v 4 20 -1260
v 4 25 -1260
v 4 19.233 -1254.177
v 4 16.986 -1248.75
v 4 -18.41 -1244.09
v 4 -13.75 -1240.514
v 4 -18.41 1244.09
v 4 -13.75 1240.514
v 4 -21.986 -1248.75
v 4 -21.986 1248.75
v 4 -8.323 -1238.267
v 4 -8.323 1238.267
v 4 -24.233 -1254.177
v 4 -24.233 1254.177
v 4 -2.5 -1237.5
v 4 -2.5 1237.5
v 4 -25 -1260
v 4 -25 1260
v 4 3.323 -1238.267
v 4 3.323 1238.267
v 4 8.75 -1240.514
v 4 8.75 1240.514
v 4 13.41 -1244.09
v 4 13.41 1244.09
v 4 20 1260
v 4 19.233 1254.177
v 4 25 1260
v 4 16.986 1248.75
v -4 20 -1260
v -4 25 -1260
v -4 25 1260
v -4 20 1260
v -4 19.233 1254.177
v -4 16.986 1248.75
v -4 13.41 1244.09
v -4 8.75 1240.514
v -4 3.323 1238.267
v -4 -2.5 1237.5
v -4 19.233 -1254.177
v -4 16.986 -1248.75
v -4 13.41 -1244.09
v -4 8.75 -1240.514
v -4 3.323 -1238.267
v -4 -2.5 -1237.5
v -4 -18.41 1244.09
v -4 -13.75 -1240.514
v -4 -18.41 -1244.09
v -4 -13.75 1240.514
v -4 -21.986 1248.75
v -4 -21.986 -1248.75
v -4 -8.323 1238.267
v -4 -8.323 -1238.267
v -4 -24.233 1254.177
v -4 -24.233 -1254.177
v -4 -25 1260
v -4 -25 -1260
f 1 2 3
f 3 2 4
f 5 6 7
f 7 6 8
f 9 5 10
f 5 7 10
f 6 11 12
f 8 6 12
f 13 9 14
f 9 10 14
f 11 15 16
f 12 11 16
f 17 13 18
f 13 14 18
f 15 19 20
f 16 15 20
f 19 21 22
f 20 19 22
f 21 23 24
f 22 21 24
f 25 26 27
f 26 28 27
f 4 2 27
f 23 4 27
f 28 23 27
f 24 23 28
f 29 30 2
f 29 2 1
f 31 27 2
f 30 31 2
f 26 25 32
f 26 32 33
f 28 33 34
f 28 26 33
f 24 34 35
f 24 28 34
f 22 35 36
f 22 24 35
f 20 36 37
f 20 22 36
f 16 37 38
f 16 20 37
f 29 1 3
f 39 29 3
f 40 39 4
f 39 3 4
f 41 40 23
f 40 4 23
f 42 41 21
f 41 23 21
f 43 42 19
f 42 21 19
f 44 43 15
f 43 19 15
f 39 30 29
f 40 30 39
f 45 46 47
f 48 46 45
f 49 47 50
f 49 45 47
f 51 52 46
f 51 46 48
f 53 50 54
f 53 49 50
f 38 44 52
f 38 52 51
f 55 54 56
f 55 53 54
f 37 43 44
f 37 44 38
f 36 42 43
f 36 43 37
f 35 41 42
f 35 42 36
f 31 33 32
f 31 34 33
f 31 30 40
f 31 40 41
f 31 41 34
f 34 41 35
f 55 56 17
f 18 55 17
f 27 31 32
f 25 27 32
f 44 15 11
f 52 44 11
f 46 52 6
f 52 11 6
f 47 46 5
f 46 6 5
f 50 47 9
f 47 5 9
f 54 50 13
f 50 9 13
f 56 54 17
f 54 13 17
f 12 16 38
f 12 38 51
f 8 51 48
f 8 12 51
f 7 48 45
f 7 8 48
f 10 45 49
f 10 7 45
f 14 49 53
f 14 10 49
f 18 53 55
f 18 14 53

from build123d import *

# Parameters (mm, degrees)
SKETCH_1_W      = 8
SKETCH_1_H      = 50
EXTRUDE_1_DEPTH = 1237.5
EXTRUDE_2_DEPTH = 8


with BuildPart() as part:
    # Эскиз1 → Бобышка-Вытянуть1 (new, symmetric)
    with BuildSketch(Plane.XY):
        Rectangle(SKETCH_1_W, SKETCH_1_H)
    extrude(amount=EXTRUDE_1_DEPTH, both=True)

    # Эскиз2 → Бобышка-Вытянуть2 (add)
    with BuildSketch(Plane(origin=(4, 0, 0), x_dir=(0, 0, -1), z_dir=(1, 0, 0))):
        with BuildLine():
            Line((-1237.5, -2.500000274), (-1237.5, 25))
            Line((-1237.5, 25), (-1260, 25))
            Line((-1260, 25), (-1260, 20))
            ThreePointArc((-1260, 20), (-1244.090097326, 13.40990248), (-1237.5, -2.500000274))
        make_face()
        with BuildLine():
            Line((-1237.5, -25), (-1237.5, -2.500000274))
            ThreePointArc((-1237.5, -2.500000274), (-1244.09009752, -18.409902674), (-1260, -25))
            Line((-1260, -25), (-1237.5, -25))
        make_face()
    extrude_2 = extrude(amount=-EXTRUDE_2_DEPTH)

    # Зеркальное отражение1: Бобышка-Вытянуть2 across plane
    add(extrude_2.mirror(Plane.XY))


solid = part.part
